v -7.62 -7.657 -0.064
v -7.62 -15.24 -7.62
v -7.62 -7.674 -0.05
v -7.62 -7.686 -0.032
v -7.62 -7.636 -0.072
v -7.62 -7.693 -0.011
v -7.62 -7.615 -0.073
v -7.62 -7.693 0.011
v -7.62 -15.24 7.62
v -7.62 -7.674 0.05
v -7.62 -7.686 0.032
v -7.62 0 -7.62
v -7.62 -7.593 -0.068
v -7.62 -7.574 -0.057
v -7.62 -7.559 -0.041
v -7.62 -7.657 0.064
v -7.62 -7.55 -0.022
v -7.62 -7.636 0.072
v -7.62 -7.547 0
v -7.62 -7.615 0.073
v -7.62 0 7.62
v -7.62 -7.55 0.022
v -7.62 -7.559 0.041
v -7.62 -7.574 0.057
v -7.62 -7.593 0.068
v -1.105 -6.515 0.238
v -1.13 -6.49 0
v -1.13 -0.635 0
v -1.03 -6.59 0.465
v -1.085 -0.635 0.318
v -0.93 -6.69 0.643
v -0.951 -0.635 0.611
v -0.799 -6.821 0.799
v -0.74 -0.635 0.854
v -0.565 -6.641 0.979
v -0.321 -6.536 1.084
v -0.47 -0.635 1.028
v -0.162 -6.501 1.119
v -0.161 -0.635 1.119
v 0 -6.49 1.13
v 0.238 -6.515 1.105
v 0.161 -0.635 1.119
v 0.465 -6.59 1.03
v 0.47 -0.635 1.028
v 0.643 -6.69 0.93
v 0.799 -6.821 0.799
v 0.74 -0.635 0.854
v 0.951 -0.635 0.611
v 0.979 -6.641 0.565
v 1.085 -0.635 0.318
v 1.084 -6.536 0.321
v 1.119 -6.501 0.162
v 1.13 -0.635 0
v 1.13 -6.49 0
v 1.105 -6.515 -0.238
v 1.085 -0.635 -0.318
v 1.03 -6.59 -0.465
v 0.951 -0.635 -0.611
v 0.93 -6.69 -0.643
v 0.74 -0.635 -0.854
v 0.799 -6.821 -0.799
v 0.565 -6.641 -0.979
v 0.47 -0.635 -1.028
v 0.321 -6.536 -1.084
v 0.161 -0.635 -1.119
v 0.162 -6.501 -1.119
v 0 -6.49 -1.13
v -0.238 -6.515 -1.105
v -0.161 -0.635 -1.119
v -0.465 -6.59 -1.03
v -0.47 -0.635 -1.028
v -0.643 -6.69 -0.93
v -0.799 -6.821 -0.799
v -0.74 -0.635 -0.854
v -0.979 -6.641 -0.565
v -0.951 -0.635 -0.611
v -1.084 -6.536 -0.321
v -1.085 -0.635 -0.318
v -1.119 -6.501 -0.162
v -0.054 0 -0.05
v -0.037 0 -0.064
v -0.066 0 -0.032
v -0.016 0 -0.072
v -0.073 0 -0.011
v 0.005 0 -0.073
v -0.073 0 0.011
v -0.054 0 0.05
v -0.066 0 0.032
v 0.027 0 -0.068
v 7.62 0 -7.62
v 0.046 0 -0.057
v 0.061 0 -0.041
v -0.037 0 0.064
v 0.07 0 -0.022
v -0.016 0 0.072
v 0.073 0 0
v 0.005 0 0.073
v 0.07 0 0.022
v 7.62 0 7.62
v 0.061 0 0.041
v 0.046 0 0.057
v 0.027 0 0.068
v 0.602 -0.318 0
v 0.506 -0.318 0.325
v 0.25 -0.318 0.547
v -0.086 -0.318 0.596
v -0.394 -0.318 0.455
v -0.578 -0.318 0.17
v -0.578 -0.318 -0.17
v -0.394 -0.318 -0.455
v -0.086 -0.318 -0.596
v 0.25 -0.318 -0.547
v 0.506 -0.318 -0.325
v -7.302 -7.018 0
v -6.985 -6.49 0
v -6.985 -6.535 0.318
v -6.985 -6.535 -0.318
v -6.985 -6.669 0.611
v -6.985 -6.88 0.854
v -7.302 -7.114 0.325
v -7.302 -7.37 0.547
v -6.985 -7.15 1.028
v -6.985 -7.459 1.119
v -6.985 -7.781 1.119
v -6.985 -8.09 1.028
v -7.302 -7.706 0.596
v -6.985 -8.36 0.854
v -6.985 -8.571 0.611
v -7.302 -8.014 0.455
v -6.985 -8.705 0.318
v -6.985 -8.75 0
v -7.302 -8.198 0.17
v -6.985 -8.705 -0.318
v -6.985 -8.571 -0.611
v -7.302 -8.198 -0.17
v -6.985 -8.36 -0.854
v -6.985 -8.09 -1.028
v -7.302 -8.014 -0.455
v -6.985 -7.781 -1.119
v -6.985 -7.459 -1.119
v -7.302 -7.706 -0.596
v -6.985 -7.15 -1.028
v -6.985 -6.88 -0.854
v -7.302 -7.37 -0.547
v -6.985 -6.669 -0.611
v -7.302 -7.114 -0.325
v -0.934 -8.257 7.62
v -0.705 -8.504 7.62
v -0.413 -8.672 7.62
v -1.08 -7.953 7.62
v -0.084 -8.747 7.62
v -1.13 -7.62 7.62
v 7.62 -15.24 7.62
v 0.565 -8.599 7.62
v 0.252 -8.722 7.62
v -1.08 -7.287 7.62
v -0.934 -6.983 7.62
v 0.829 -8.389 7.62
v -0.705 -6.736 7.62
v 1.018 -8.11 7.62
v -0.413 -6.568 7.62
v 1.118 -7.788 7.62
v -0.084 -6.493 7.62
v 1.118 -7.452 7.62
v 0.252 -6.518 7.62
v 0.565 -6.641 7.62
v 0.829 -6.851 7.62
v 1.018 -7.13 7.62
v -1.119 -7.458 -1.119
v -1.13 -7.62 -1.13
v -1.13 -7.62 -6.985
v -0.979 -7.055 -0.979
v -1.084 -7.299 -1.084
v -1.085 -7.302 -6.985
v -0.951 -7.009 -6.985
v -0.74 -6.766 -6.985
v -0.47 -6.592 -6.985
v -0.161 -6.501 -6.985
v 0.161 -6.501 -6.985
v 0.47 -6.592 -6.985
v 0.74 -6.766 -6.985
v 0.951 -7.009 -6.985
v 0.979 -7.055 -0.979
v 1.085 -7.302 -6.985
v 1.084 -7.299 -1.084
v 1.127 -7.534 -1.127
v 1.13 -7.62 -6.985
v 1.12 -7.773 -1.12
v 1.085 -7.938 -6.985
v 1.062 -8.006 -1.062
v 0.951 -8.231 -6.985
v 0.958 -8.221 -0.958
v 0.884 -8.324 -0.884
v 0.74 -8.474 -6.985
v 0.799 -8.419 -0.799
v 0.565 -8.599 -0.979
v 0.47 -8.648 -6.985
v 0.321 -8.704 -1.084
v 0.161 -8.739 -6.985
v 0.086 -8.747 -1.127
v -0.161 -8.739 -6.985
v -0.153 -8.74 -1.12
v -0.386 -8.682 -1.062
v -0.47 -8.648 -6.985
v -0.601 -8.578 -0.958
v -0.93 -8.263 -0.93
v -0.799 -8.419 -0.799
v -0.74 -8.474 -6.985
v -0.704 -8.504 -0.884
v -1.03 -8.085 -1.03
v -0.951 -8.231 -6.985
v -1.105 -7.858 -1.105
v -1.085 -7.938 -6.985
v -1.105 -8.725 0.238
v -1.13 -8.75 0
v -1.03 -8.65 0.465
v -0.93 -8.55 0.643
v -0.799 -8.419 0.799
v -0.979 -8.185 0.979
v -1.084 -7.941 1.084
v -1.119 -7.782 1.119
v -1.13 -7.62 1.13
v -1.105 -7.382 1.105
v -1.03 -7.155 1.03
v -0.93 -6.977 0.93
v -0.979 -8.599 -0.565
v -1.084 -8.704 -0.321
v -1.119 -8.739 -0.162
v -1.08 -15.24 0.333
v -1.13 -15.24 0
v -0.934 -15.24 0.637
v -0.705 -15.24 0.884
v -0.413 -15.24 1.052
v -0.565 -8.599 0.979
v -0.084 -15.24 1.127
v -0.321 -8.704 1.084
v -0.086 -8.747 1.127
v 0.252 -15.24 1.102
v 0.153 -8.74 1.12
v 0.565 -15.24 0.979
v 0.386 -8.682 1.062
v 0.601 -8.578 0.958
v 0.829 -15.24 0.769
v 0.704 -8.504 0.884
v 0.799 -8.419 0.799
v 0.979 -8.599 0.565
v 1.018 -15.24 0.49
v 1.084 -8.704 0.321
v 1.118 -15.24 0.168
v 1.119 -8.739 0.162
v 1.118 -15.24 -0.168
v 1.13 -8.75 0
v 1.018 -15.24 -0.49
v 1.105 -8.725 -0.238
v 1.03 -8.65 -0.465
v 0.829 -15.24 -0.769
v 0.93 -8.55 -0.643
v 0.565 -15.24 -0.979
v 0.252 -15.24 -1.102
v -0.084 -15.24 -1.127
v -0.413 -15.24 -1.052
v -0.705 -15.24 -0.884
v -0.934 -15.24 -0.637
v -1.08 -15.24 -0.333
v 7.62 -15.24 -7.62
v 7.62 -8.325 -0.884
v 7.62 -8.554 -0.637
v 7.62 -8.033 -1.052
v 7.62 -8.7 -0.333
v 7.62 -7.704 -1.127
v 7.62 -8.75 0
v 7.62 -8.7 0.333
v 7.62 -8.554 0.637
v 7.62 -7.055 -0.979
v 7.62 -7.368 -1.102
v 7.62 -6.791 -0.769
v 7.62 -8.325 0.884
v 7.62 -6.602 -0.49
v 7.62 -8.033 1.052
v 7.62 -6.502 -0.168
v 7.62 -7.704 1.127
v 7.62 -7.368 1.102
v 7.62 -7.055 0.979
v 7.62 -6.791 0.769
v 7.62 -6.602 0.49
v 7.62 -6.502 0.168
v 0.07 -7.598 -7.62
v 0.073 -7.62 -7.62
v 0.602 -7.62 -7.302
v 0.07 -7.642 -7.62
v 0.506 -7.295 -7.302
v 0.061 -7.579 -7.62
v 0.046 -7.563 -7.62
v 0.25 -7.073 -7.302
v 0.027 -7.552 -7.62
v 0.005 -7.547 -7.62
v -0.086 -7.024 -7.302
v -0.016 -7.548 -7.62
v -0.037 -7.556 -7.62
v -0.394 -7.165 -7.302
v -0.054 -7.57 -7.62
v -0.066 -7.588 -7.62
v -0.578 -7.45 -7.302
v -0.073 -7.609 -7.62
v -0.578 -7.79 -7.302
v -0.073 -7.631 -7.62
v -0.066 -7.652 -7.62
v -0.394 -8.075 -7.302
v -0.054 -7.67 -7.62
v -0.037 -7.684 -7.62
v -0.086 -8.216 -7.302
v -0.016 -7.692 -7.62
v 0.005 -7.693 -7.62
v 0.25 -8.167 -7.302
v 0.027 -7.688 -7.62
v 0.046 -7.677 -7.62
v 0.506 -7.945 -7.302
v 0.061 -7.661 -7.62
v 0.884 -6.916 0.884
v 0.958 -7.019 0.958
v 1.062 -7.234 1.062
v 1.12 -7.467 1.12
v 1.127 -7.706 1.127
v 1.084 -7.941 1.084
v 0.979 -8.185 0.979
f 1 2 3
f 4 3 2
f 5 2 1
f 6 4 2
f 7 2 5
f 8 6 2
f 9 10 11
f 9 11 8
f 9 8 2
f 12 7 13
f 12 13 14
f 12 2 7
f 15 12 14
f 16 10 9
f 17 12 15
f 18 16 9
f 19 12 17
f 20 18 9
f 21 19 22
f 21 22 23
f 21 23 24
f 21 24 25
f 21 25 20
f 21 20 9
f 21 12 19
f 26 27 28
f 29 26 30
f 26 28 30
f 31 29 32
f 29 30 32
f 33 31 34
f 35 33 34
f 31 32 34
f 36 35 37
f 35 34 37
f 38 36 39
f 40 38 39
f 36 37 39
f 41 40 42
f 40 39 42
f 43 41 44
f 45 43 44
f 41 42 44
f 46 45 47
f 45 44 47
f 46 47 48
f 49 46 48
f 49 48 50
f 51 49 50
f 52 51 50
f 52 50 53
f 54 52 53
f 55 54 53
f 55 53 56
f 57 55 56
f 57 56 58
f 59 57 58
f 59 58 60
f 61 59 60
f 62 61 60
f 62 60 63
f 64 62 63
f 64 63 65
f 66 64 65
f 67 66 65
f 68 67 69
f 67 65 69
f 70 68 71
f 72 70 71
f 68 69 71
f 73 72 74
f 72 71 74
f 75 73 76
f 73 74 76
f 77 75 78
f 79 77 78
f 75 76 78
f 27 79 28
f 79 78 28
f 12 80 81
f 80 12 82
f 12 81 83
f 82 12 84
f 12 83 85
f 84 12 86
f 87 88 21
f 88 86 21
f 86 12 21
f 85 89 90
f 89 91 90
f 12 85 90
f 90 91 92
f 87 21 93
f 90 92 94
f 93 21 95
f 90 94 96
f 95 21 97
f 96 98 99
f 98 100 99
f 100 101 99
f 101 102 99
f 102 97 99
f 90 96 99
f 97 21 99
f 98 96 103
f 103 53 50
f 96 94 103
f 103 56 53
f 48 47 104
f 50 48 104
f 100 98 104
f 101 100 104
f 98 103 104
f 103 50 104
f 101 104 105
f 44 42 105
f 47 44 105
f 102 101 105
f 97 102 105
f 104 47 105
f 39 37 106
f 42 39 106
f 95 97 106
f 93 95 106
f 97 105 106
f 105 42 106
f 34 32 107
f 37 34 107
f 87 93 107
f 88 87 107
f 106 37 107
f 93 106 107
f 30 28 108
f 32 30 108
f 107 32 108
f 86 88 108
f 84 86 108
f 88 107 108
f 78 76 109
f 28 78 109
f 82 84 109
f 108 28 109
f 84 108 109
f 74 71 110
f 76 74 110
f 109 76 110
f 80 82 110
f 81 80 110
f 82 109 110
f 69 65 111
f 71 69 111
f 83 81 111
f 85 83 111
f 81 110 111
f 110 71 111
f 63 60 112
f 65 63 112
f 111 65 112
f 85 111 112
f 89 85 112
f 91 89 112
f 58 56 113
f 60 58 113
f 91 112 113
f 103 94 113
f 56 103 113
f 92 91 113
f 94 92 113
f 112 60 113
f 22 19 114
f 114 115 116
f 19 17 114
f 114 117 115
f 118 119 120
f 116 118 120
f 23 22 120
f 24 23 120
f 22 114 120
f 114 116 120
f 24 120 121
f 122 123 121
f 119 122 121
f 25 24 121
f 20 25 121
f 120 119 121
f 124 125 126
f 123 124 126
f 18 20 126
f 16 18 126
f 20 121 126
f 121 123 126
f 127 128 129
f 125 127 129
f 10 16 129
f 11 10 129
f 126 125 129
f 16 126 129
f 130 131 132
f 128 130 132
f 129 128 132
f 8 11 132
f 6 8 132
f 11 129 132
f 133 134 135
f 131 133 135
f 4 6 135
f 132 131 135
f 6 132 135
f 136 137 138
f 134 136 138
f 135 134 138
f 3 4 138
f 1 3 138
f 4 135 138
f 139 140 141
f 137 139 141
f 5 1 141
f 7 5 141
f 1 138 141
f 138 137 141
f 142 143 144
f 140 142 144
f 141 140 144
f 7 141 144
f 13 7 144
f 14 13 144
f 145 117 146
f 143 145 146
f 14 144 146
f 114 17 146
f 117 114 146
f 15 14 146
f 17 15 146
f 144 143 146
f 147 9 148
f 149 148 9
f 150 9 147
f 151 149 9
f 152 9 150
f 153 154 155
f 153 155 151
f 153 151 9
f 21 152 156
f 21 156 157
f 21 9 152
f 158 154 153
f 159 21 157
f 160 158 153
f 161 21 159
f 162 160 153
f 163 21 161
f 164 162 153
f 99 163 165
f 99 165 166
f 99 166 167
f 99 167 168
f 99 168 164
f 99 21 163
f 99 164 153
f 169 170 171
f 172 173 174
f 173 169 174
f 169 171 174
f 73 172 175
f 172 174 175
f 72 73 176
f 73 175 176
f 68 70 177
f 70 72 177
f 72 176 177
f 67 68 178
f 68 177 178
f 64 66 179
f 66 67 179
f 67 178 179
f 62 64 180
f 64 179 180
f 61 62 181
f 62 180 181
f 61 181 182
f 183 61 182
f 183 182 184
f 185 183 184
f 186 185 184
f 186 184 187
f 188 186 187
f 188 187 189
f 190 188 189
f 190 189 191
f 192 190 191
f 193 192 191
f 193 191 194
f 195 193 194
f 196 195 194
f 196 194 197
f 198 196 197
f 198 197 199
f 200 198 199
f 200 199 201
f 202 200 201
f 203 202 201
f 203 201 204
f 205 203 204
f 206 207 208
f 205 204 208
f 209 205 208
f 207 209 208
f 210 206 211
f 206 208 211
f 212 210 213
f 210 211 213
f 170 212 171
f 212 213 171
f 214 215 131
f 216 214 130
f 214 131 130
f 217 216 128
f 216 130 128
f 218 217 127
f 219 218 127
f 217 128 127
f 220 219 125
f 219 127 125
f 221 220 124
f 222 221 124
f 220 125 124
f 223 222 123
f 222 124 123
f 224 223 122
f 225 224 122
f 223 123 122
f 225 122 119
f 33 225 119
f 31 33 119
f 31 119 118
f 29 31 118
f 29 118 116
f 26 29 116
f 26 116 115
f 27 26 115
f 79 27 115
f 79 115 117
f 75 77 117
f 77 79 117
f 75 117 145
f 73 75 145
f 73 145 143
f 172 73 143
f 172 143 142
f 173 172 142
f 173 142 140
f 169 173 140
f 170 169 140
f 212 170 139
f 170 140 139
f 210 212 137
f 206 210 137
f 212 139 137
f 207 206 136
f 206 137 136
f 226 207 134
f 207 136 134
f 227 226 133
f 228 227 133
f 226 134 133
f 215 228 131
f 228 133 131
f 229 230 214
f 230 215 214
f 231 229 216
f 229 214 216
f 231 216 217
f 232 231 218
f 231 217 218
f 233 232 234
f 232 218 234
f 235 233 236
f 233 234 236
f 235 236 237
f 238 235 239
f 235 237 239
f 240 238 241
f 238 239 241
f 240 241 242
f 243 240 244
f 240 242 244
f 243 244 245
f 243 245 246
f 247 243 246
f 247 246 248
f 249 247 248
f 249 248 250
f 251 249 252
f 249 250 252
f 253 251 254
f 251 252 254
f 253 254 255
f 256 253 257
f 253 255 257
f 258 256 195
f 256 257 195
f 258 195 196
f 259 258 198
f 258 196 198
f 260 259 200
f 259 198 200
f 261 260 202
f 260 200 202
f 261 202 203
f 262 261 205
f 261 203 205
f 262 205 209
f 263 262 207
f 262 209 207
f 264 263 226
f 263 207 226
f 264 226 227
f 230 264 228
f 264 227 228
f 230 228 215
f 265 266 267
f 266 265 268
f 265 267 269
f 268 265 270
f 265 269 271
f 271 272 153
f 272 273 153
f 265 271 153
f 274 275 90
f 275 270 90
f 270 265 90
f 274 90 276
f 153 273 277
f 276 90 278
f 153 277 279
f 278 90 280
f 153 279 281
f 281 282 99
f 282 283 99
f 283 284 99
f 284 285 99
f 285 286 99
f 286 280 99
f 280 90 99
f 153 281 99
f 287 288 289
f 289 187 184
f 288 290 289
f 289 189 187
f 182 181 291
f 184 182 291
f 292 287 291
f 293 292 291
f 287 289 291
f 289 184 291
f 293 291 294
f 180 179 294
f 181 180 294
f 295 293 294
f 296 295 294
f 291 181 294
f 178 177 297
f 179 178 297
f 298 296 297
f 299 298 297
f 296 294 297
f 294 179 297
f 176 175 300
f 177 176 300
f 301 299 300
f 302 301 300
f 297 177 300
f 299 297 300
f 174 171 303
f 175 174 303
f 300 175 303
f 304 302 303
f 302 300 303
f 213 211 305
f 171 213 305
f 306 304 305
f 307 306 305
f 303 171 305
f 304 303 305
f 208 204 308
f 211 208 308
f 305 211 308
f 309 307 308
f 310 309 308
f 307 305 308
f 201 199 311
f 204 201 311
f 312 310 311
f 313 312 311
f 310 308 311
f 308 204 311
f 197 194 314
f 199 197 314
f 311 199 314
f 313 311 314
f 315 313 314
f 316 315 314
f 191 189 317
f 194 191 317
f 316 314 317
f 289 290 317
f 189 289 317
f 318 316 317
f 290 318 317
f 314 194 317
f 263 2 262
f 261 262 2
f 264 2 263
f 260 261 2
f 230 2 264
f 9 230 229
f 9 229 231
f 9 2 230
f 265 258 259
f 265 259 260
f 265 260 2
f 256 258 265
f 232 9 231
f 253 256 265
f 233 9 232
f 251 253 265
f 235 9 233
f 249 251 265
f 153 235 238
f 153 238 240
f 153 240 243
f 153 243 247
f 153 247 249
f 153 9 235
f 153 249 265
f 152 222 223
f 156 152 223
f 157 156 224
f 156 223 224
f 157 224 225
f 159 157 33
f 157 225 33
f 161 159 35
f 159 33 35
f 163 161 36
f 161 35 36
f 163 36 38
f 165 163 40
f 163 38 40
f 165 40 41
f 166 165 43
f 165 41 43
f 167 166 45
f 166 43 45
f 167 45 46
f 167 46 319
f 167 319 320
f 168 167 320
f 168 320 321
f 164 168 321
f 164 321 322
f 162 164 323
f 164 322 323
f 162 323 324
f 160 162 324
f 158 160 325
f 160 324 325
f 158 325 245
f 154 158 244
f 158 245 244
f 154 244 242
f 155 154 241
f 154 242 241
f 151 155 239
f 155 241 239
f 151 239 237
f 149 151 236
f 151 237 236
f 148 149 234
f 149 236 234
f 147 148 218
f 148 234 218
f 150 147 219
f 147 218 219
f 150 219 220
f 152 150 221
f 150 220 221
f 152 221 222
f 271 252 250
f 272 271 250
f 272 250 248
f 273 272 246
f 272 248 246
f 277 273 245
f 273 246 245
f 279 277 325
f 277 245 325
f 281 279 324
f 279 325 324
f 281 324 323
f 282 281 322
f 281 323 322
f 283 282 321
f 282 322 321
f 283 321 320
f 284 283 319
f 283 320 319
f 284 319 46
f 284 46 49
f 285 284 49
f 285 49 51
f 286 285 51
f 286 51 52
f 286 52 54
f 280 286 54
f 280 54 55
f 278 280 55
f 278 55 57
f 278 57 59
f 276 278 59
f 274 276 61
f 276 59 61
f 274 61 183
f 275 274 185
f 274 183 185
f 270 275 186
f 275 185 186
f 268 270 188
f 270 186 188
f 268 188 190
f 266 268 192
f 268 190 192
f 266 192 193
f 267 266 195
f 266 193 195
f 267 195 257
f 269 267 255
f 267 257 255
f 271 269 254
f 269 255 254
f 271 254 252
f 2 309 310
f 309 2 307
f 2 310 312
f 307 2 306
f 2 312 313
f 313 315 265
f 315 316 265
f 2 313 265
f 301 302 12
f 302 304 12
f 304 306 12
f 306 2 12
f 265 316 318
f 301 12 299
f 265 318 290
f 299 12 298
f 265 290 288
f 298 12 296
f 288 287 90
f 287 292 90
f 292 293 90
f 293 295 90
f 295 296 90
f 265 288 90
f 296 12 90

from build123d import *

# Parameters (mm, degrees)
F0_W     = 15.24
F0_H     = 15.24
F1_DEPTH = 15.24
F3_D     = 2.2606
F3_DEPTH = 14.605
F3_TIP   = 0.6791527577
F6_D     = 2.2606
F6_DEPTH = 14.605
F6_TIP   = 0.6791527577
F7_D     = 2.2606
F7_DEPTH = 14.605
F7_TIP   = 0.6791527577


with BuildPart() as f1:
    # F0 (on Front) → F1 (new body)
    with BuildSketch(Plane.XZ):
        Rectangle(F0_W, F0_H)
    extrude(amount=F1_DEPTH)

    # F3
    with Locations(Plane.XZ.offset(15.24)):
        with Locations((0, 0)):
            Hole(F3_D / 2, depth=F3_DEPTH)
            with Locations((0, 0, -(F3_DEPTH + F3_TIP / 2))):  # 118° drill point
                Cone(0, F3_D / 2, F3_TIP, mode=Mode.SUBTRACT)

    # F6
    with Locations(Plane.YZ.offset(7.62)):
        with Locations((-7.62, 0)):
            Hole(F6_D / 2, depth=F6_DEPTH)
            with Locations((0, 0, -(F6_DEPTH + F6_TIP / 2))):  # 118° drill point
                Cone(0, F6_D / 2, F6_TIP, mode=Mode.SUBTRACT)

    # F7
    with Locations(Plane.XY.offset(7.62)):
        with Locations((0, -7.62)):
            Hole(F7_D / 2, depth=F7_DEPTH)
            with Locations((0, 0, -(F7_DEPTH + F7_TIP / 2))):  # 118° drill point
                Cone(0, F7_D / 2, F7_TIP, mode=Mode.SUBTRACT)


solid = f1.part
